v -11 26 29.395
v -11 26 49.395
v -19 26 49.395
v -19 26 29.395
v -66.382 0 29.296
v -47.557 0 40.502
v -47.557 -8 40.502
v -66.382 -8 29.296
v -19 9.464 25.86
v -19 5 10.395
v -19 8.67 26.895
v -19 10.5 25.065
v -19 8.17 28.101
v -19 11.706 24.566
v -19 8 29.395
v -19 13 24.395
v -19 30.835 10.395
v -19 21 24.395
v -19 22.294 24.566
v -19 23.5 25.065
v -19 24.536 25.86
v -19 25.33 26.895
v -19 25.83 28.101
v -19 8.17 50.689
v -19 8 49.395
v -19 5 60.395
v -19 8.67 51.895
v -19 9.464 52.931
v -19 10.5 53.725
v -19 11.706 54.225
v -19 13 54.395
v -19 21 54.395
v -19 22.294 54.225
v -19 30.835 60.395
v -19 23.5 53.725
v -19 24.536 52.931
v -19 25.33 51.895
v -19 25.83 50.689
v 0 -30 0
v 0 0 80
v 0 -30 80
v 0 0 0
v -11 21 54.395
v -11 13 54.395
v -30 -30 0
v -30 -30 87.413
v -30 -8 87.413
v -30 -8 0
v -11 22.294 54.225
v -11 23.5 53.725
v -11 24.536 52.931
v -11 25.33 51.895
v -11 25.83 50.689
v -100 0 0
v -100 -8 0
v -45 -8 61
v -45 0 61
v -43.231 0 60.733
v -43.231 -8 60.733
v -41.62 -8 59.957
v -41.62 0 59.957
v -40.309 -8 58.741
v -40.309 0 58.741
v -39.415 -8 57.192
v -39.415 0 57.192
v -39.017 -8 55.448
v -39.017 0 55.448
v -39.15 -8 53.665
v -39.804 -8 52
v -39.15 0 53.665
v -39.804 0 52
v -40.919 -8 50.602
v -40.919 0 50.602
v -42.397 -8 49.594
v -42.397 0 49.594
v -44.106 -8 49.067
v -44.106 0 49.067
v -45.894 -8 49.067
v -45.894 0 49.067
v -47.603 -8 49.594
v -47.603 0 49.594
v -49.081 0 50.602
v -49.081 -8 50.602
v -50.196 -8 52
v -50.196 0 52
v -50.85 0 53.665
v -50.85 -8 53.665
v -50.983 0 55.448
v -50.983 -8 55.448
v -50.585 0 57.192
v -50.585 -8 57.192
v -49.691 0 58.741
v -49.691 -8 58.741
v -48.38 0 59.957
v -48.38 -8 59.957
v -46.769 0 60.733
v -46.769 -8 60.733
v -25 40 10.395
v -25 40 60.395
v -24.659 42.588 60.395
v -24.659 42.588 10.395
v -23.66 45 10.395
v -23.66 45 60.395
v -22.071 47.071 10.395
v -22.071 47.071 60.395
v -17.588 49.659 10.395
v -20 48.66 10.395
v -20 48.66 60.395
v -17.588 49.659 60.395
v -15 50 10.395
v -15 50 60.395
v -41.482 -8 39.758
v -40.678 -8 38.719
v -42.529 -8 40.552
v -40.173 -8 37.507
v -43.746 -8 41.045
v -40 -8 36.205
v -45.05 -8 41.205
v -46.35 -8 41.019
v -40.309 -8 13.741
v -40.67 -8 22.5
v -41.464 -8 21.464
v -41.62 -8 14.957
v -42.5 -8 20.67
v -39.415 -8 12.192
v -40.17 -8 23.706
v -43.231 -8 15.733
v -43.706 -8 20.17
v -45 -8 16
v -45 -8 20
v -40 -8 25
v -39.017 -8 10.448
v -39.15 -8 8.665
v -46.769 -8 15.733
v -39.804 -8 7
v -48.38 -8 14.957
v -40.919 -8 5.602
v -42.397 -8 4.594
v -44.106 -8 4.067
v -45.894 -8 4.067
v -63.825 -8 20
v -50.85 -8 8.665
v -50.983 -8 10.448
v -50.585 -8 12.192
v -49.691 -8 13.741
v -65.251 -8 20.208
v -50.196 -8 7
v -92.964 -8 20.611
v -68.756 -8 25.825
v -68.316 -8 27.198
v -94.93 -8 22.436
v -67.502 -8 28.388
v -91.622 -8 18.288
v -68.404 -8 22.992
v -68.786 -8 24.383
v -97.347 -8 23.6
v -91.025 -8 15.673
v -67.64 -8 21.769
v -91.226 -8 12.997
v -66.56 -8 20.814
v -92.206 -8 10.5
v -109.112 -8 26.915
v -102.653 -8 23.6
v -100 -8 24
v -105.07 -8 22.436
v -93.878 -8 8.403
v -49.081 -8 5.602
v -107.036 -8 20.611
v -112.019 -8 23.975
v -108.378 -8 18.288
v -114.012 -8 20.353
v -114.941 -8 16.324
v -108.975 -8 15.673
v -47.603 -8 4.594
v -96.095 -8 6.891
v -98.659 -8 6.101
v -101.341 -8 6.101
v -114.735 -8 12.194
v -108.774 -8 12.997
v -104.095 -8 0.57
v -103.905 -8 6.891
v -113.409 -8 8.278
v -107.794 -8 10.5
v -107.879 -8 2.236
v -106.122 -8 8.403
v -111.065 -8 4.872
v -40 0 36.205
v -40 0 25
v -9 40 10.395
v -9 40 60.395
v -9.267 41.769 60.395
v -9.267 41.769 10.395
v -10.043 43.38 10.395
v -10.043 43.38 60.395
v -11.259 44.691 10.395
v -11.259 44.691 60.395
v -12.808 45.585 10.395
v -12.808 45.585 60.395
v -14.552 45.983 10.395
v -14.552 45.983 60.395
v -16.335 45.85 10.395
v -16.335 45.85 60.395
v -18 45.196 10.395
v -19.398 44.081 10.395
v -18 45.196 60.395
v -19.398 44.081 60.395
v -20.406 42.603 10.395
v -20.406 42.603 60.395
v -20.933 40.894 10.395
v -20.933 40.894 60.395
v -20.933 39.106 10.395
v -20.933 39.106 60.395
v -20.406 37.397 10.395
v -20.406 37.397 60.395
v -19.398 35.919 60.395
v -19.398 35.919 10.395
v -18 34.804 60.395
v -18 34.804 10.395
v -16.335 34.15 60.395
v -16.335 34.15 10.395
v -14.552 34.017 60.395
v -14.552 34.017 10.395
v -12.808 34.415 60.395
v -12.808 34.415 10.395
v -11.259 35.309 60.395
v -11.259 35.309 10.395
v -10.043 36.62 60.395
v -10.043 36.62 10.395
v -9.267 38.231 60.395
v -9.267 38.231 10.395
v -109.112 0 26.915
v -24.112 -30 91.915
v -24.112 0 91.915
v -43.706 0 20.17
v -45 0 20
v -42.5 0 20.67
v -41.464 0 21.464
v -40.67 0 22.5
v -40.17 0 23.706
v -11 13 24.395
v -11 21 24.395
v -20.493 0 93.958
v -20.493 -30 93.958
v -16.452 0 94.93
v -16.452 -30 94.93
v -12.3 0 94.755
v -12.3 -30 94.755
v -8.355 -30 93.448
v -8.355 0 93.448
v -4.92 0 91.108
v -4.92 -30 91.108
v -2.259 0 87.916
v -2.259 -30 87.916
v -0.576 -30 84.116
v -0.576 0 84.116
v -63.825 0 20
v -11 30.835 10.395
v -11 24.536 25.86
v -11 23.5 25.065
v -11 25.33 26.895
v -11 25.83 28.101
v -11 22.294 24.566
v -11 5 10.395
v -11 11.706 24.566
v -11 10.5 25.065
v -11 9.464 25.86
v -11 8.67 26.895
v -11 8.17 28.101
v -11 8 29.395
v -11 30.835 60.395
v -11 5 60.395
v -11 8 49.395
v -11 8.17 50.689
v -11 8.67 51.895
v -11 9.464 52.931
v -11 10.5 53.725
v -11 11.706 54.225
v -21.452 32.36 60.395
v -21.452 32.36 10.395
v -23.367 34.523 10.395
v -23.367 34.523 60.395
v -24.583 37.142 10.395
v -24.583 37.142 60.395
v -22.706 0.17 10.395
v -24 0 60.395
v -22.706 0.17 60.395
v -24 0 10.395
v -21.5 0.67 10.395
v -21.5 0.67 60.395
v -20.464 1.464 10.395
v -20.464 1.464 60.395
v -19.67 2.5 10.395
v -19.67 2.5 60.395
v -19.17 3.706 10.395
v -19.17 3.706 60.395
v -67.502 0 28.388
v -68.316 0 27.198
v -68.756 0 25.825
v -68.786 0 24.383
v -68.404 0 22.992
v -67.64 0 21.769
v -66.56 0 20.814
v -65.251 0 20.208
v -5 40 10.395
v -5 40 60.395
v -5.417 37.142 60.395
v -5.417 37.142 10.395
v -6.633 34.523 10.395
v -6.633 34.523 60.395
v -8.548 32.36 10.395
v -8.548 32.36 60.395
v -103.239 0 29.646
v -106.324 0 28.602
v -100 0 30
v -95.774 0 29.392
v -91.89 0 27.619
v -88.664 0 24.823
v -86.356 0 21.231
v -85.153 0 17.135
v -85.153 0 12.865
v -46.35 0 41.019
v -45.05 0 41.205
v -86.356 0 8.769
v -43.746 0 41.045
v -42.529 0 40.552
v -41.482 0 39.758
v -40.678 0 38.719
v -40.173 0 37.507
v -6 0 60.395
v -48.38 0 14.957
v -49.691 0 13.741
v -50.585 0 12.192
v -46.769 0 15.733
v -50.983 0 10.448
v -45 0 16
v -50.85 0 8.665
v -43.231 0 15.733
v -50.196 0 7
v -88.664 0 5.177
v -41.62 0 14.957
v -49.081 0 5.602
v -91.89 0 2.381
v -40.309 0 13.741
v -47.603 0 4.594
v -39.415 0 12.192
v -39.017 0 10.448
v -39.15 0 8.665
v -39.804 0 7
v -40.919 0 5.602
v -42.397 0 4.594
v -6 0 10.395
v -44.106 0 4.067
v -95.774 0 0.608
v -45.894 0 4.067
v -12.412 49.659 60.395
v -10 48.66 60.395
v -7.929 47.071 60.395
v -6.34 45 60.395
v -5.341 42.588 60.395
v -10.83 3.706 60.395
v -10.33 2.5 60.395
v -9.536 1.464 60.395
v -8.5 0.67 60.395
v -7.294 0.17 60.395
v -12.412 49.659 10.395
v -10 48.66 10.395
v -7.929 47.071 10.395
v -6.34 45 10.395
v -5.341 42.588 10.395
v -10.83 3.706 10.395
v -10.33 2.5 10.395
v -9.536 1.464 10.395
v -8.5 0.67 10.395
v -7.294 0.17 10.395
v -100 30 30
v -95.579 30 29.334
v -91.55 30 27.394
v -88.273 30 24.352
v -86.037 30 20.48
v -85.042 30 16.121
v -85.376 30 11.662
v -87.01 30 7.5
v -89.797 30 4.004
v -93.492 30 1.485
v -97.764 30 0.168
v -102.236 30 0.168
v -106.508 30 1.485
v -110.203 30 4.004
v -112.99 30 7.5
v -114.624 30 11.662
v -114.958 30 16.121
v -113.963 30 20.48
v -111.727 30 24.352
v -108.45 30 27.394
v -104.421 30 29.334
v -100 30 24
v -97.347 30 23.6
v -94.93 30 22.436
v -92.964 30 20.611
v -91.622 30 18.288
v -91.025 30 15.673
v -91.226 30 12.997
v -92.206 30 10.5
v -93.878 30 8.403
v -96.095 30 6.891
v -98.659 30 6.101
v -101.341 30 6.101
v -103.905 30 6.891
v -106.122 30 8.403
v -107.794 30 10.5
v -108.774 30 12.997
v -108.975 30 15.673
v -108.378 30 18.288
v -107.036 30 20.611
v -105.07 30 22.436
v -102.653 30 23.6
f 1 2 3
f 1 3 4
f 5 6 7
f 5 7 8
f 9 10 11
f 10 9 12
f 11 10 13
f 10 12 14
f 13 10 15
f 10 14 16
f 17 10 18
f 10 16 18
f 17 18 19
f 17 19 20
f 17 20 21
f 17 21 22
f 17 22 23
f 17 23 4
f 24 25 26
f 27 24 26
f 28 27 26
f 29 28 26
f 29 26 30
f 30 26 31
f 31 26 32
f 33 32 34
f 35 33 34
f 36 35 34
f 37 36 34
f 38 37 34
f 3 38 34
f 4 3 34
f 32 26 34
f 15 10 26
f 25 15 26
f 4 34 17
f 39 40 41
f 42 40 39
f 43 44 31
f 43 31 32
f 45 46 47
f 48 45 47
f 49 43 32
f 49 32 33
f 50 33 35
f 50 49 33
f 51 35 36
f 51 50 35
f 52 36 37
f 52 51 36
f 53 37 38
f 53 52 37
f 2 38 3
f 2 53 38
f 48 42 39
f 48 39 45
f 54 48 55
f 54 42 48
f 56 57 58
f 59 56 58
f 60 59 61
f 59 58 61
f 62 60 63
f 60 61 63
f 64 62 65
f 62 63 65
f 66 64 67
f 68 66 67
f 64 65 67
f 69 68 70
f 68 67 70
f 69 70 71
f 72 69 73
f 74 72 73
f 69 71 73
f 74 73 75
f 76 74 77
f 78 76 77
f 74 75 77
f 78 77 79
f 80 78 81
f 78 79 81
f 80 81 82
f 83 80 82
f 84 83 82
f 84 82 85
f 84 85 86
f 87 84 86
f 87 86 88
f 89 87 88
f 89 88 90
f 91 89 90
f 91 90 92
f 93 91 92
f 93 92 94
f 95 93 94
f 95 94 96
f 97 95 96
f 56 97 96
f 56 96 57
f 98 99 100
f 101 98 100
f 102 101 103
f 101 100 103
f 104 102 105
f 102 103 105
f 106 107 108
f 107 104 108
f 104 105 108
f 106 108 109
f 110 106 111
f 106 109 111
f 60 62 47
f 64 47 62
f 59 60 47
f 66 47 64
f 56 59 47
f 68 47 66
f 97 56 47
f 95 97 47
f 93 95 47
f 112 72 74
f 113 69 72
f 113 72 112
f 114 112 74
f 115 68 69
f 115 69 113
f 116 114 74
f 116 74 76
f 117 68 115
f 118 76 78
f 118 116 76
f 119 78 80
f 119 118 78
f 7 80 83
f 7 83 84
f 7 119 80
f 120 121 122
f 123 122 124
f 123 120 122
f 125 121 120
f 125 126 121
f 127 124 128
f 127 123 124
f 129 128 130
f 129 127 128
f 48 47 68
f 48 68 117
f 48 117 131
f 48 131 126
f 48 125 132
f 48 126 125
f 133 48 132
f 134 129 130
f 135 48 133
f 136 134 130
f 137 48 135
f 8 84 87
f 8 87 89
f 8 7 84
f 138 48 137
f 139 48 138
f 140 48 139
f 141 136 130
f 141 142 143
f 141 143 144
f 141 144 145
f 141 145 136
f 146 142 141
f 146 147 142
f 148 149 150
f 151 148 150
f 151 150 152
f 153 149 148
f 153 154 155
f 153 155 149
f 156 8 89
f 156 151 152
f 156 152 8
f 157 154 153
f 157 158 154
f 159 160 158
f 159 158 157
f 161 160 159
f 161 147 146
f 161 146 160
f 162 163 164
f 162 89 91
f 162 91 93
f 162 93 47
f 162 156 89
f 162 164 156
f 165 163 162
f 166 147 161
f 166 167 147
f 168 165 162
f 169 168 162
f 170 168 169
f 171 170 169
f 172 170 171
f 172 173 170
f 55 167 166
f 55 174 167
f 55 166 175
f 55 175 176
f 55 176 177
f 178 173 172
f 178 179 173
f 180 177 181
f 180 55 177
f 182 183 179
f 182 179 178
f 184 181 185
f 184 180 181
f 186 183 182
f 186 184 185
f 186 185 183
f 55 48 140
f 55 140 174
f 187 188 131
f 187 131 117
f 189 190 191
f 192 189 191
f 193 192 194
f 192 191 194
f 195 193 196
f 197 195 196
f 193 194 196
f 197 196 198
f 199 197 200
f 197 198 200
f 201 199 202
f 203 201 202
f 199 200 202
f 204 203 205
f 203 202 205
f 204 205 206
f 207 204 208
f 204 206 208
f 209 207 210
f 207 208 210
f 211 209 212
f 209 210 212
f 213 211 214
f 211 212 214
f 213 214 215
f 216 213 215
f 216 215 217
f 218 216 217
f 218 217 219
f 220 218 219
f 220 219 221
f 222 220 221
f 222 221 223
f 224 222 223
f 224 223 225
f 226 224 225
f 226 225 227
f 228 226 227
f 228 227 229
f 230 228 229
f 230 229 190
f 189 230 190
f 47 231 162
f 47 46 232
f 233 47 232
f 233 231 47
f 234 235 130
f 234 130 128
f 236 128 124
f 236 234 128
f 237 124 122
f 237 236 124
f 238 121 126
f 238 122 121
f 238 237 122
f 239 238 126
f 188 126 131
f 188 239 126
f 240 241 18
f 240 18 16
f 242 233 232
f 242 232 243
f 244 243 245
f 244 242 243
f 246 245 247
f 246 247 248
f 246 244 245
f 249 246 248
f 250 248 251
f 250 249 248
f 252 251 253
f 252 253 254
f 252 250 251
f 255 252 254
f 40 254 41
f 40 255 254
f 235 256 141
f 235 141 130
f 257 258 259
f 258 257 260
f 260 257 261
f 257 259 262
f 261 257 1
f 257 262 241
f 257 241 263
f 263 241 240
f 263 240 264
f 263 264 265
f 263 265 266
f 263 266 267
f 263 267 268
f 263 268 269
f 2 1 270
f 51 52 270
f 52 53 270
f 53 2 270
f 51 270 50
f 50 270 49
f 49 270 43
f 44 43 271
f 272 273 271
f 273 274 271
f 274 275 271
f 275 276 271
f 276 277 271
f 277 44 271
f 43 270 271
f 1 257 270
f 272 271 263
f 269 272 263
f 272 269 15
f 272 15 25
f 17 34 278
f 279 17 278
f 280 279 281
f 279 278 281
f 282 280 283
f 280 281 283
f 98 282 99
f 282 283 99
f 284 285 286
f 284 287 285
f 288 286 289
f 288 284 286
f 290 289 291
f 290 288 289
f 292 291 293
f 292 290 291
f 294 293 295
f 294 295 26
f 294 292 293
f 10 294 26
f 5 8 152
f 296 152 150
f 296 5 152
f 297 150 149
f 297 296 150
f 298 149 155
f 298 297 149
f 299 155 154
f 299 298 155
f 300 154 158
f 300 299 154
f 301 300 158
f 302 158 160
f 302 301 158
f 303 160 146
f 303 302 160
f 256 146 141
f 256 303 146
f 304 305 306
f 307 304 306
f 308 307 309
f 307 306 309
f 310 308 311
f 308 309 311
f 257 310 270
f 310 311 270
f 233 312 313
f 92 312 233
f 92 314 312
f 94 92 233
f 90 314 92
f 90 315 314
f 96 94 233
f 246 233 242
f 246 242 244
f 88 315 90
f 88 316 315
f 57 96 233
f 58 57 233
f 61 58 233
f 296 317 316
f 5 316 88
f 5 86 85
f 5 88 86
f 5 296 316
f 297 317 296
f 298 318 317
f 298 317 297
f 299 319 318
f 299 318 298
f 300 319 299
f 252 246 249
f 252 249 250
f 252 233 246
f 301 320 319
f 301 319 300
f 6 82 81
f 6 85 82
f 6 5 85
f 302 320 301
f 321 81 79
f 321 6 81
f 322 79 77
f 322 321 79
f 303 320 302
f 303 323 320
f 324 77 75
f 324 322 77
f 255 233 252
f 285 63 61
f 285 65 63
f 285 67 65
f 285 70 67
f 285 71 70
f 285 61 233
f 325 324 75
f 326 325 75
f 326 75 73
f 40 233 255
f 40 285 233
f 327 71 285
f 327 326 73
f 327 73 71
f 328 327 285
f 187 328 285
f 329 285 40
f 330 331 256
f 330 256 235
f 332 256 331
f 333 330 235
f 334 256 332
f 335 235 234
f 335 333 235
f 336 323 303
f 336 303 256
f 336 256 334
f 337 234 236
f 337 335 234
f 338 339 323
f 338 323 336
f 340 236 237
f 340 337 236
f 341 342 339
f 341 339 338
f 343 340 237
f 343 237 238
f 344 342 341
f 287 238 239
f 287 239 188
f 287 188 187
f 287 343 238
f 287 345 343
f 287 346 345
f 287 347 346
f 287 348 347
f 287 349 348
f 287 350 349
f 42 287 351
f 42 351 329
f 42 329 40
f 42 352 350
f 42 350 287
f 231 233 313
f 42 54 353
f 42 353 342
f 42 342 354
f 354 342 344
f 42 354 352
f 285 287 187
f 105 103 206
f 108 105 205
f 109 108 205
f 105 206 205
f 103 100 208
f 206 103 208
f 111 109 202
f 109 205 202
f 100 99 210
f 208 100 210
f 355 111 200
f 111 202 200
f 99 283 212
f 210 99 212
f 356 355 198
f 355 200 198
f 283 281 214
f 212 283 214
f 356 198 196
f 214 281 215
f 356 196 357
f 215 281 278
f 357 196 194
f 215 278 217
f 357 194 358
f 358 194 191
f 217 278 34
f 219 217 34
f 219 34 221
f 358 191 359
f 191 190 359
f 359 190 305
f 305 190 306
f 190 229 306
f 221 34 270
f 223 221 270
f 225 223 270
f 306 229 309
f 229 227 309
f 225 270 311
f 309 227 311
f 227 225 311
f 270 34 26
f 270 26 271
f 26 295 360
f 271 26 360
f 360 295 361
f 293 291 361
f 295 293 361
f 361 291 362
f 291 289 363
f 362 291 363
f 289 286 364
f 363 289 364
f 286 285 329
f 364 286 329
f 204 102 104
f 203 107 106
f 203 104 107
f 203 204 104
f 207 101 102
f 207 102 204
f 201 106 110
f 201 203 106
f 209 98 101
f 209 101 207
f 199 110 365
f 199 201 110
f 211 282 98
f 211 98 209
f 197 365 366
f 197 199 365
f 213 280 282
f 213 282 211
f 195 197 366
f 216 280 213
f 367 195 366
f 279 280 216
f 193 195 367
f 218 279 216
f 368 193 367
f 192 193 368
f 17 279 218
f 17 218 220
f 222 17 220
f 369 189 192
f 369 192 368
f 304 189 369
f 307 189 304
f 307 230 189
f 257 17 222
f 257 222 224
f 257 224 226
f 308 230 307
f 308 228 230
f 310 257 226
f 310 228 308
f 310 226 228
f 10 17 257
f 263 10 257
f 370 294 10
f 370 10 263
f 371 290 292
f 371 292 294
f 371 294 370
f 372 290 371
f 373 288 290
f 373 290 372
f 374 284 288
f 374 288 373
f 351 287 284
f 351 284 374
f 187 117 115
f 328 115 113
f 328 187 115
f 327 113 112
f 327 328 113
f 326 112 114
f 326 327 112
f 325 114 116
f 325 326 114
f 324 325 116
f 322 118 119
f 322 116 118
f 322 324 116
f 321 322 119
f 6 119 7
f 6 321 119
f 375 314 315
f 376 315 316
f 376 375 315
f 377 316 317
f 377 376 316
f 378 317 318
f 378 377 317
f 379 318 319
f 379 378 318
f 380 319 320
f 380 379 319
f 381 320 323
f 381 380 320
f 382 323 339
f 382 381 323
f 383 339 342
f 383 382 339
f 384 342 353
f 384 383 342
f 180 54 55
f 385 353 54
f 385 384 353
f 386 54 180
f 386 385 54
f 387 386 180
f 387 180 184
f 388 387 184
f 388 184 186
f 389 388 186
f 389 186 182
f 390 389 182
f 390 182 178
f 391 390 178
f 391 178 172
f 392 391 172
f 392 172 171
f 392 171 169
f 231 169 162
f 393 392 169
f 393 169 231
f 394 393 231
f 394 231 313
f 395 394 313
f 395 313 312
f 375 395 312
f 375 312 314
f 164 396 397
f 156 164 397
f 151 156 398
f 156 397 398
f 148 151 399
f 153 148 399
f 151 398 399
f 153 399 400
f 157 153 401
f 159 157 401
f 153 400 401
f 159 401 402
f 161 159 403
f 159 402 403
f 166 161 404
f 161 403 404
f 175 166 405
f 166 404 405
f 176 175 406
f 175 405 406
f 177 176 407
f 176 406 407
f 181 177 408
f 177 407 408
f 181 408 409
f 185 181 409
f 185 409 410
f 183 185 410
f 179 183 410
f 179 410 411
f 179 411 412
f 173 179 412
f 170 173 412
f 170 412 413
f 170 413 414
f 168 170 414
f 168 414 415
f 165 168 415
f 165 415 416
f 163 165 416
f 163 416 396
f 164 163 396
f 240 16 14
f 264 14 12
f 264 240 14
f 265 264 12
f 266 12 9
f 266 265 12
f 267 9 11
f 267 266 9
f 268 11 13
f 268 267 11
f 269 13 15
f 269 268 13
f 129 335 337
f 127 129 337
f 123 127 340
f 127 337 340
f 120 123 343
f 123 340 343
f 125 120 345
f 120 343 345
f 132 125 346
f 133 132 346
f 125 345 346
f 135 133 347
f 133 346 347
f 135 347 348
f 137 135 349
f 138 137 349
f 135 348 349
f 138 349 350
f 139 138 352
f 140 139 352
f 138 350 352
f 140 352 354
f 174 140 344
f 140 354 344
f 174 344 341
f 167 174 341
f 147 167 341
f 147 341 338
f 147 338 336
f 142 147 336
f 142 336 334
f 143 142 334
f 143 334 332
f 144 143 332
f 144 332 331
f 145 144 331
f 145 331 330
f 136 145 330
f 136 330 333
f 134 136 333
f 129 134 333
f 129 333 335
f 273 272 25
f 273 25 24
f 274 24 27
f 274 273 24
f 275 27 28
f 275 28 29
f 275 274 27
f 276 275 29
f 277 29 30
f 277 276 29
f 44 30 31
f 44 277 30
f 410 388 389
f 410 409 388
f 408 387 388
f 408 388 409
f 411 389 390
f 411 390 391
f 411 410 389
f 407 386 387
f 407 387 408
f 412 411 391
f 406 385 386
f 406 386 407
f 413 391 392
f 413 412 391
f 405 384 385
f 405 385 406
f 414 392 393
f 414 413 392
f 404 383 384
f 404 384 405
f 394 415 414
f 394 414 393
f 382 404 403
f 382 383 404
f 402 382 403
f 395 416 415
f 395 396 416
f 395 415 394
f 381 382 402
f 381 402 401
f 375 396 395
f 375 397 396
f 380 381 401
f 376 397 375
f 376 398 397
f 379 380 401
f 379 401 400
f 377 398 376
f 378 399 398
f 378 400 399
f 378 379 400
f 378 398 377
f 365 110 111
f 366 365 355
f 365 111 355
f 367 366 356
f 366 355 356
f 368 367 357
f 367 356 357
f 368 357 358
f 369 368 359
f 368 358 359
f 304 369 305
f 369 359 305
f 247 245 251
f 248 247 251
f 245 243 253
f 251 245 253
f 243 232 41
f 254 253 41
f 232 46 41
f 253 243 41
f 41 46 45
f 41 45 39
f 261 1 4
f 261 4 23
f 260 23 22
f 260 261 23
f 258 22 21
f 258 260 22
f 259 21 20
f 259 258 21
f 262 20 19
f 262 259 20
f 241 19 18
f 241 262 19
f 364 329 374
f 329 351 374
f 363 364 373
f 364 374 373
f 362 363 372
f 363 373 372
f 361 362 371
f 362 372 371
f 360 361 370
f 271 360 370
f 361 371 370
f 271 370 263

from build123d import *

# Parameters (mm, degrees)
SKETCH1_R           = 15
SKETCH1_R_2         = 9
SKETCH1_R_3         = 6
SKETCH1_W           = 10
SKETCH1_H           = 50
BOSS_EXTRUDE2_DEPTH = 30
SKETCH2_W           = 112.950636881
SKETCH2_H           = 38.744396061
CUT_EXTRUDE1_DEPTH  = 153.151240547
BOSS_EXTRUDE3_START = 30
SKETCH1_3_R         = 15
SKETCH1_3_R_2       = 9
BOSS_EXTRUDE3_DEPTH = 30
SKETCH1_4_W         = 20
SKETCH1_4_H         = 50
BOSS_EXTRUDE4_DEPTH = 50
SKETCH3_R           = 6
CUT_EXTRUDE2_DEPTH  = 140.185416071
FILLET1_R           = 5
CUT_EXTRUDE3_DEPTH  = 8


with BuildPart() as part:
    # Sketch1 → Boss-Extrude2 (new body)
    # profile 1 of 4: a face of its own
    with BuildSketch(Plane(origin=(0, 0, 0), x_dir=(1, 0, 0), z_dir=(0, 1, 0))):
        with Locations((-100, -15)):
            Circle(SKETCH1_R)
        with Locations(Location((-100, -15, 0), (0, 0, 270))):
            Circle(SKETCH1_R_2, mode=Mode.SUBTRACT)
    # profile 2 of 4: a face of its own
    with BuildSketch(Plane(origin=(0, 0, 0), x_dir=(1, 0, 0), z_dir=(0, 1, 0))):
        with BuildLine():
            Line((0, -80), (0, 0))
            Line((0, 0), (-100, 0))
            ThreePointArc((-100, 0), (-89.393398282, -4.393398282), (-85, -15))
            ThreePointArc((-85, -15), (-93.354560745, -28.447607114), (-109.111751614, -26.915367495))
            Line((-109.111751614, -26.915367495), (-24.111751614, -91.915367495))
            ThreePointArc((-24.111751614, -91.915367495), (-8.354560745, -93.447607114), (0, -80))
        make_face()
        with Locations(Location((-45, -55, 0), (0, 0, 270))):
            Circle(SKETCH1_R_3, mode=Mode.SUBTRACT)
        with BuildLine():
            ThreePointArc((-66.381939771, -29.296464422), (-68.64542921, -23.673787745), (-63.824520472, -20))
            Line((-63.824520472, -20), (-45, -20))
            ThreePointArc((-45, -20), (-41.464466094, -21.464466094), (-40, -25))
            Line((-40, -25), (-40, -36.20507171))
            ThreePointArc((-40, -36.20507171), (-42.528876419, -40.551742648), (-47.557419299, -40.501536132))
            Line((-47.557419299, -40.501536132), (-66.381939771, -29.296464422))
        make_face(mode=Mode.SUBTRACT)
        Polygon((-25, -60.395198873), (-25, -10.395198873), (-15, -10.395198873), (-5, -10.395198873), (-5, -60.395198873), (-15, -60.395198873), align=None, mode=Mode.SUBTRACT)
        with Locations(Location((-45, -10, 0), (0, 0, 270))):
            Circle(SKETCH1_R_3, mode=Mode.SUBTRACT)
    # profile 3 of 4: a face of its own
    with BuildSketch(Plane(origin=(0, 0, 0), x_dir=(1, 0, 0), z_dir=(0, 1, 0))):
        with Locations((-10, -35.395198873)):
            Rectangle(SKETCH1_W, SKETCH1_H)
    # profile 4 of 4: a face of its own
    with BuildSketch(Plane(origin=(0, 0, 0), x_dir=(1, 0, 0), z_dir=(0, 1, 0))):
        with Locations((-20, -35.395198873)):
            Rectangle(SKETCH1_W, SKETCH1_H)
    extrude(amount=-BOSS_EXTRUDE2_DEPTH)

    # Sketch2 → Cut-Extrude1 (cut, through all)
    with BuildSketch(Plane(origin=(0, 0, 0), x_dir=(-1, 0, 0), z_dir=(0, 0, -1))):
        with Locations((86.475318441, -27.372198031)):
            Rectangle(SKETCH2_W, SKETCH2_H)
    extrude(amount=-CUT_EXTRUDE1_DEPTH, mode=Mode.SUBTRACT)

    # Sketch1<3> → Boss-Extrude3 (add)
    with BuildSketch(Plane(origin=(0, 0, 0), x_dir=(1, 0, 0), z_dir=(0, 1, 0)).offset(BOSS_EXTRUDE3_START)):
        with Locations(Location((-100, -15, 0), (0, 0, 270))):
            Circle(SKETCH1_3_R)
        with Locations(Location((-100, -15, 0), (0, 0, 270))):
            Circle(SKETCH1_3_R_2, mode=Mode.SUBTRACT)
    extrude(amount=-BOSS_EXTRUDE3_DEPTH)

    # Sketch1<4> → Boss-Extrude4 (add)
    with BuildSketch(Plane(origin=(0, 0, 0), x_dir=(1, 0, 0), z_dir=(0, 1, 0))):
        with Locations((-15, -35.395198873)):
            Rectangle(SKETCH1_4_W, SKETCH1_4_H)
    extrude(amount=BOSS_EXTRUDE4_DEPTH)

    # Sketch3 → Cut-Extrude2 (cut, through all)
    with BuildSketch(Plane.XY.offset(60.395198873)):
        with BuildLine():
            ThreePointArc((-19, 30.83484861), (-23.366600265, 34.522774425), (-25, 40))
            Line((-25, 40), (-25, 0))
            Line((-25, 0), (-19, 0))
            Line((-19, 0), (-19, 30.83484861))
        make_face()
        with BuildLine():
            Line((-5, 0), (-5, 40))
            ThreePointArc((-5, 40), (-6.633399735, 34.522774425), (-11, 30.83484861))
            Line((-11, 30.83484861), (-11, 0))
            Line((-11, 0), (-5, 0))
        make_face()
        with BuildLine():
            Line((-5, 50), (-14.999999965, 50))
            ThreePointArc((-14.999999965, 50), (-7.928932176, 47.0710678), (-5, 40))
            Line((-5, 40), (-5, 50))
        make_face()
        with BuildLine():
            Line((-14.999999965, 50), (-25, 50))
            Line((-25, 50), (-25, 40))
            ThreePointArc((-25, 40), (-22.0710678, 47.071067824), (-14.999999965, 50))
        make_face()
        with Locations((-15, 40)):
            Circle(SKETCH3_R)
    extrude(amount=-CUT_EXTRUDE2_DEPTH, mode=Mode.SUBTRACT)

    # Fillet1
    fillet1_edges = [part.edges().sort_by_distance(p)[0] for p in [
        (-19, 0, 35.395198873),
        (-11, 0, 35.395198873),
    ]]
    fillet(fillet1_edges, radius=FILLET1_R)

    # Sketch4 → Cut-Extrude3 (cut)
    with BuildSketch(Plane(origin=(-11, 0, 0), x_dir=(0, 0, -1), z_dir=(1, 0, 0))):
        with BuildLine():
            Line((-49.395198873, 26), (-29.395198873, 26))
            ThreePointArc((-29.395198873, 26), (-25.859664967, 24.535533906), (-24.395198873, 21))
            Line((-24.395198873, 21), (-24.395198873, 13))
            ThreePointArc((-24.395198873, 13), (-25.859664967, 9.464466094), (-29.395198873, 8))
            Line((-29.395198873, 8), (-49.395198873, 8))
            ThreePointArc((-49.395198873, 8), (-52.930732779, 9.464466094), (-54.395198873, 13))
            Line((-54.395198873, 13), (-54.395198873, 21))
            ThreePointArc((-54.395198873, 21), (-52.930732779, 24.535533906), (-49.395198873, 26))
        make_face()
    extrude(amount=-CUT_EXTRUDE3_DEPTH, mode=Mode.SUBTRACT)


solid = part.part
